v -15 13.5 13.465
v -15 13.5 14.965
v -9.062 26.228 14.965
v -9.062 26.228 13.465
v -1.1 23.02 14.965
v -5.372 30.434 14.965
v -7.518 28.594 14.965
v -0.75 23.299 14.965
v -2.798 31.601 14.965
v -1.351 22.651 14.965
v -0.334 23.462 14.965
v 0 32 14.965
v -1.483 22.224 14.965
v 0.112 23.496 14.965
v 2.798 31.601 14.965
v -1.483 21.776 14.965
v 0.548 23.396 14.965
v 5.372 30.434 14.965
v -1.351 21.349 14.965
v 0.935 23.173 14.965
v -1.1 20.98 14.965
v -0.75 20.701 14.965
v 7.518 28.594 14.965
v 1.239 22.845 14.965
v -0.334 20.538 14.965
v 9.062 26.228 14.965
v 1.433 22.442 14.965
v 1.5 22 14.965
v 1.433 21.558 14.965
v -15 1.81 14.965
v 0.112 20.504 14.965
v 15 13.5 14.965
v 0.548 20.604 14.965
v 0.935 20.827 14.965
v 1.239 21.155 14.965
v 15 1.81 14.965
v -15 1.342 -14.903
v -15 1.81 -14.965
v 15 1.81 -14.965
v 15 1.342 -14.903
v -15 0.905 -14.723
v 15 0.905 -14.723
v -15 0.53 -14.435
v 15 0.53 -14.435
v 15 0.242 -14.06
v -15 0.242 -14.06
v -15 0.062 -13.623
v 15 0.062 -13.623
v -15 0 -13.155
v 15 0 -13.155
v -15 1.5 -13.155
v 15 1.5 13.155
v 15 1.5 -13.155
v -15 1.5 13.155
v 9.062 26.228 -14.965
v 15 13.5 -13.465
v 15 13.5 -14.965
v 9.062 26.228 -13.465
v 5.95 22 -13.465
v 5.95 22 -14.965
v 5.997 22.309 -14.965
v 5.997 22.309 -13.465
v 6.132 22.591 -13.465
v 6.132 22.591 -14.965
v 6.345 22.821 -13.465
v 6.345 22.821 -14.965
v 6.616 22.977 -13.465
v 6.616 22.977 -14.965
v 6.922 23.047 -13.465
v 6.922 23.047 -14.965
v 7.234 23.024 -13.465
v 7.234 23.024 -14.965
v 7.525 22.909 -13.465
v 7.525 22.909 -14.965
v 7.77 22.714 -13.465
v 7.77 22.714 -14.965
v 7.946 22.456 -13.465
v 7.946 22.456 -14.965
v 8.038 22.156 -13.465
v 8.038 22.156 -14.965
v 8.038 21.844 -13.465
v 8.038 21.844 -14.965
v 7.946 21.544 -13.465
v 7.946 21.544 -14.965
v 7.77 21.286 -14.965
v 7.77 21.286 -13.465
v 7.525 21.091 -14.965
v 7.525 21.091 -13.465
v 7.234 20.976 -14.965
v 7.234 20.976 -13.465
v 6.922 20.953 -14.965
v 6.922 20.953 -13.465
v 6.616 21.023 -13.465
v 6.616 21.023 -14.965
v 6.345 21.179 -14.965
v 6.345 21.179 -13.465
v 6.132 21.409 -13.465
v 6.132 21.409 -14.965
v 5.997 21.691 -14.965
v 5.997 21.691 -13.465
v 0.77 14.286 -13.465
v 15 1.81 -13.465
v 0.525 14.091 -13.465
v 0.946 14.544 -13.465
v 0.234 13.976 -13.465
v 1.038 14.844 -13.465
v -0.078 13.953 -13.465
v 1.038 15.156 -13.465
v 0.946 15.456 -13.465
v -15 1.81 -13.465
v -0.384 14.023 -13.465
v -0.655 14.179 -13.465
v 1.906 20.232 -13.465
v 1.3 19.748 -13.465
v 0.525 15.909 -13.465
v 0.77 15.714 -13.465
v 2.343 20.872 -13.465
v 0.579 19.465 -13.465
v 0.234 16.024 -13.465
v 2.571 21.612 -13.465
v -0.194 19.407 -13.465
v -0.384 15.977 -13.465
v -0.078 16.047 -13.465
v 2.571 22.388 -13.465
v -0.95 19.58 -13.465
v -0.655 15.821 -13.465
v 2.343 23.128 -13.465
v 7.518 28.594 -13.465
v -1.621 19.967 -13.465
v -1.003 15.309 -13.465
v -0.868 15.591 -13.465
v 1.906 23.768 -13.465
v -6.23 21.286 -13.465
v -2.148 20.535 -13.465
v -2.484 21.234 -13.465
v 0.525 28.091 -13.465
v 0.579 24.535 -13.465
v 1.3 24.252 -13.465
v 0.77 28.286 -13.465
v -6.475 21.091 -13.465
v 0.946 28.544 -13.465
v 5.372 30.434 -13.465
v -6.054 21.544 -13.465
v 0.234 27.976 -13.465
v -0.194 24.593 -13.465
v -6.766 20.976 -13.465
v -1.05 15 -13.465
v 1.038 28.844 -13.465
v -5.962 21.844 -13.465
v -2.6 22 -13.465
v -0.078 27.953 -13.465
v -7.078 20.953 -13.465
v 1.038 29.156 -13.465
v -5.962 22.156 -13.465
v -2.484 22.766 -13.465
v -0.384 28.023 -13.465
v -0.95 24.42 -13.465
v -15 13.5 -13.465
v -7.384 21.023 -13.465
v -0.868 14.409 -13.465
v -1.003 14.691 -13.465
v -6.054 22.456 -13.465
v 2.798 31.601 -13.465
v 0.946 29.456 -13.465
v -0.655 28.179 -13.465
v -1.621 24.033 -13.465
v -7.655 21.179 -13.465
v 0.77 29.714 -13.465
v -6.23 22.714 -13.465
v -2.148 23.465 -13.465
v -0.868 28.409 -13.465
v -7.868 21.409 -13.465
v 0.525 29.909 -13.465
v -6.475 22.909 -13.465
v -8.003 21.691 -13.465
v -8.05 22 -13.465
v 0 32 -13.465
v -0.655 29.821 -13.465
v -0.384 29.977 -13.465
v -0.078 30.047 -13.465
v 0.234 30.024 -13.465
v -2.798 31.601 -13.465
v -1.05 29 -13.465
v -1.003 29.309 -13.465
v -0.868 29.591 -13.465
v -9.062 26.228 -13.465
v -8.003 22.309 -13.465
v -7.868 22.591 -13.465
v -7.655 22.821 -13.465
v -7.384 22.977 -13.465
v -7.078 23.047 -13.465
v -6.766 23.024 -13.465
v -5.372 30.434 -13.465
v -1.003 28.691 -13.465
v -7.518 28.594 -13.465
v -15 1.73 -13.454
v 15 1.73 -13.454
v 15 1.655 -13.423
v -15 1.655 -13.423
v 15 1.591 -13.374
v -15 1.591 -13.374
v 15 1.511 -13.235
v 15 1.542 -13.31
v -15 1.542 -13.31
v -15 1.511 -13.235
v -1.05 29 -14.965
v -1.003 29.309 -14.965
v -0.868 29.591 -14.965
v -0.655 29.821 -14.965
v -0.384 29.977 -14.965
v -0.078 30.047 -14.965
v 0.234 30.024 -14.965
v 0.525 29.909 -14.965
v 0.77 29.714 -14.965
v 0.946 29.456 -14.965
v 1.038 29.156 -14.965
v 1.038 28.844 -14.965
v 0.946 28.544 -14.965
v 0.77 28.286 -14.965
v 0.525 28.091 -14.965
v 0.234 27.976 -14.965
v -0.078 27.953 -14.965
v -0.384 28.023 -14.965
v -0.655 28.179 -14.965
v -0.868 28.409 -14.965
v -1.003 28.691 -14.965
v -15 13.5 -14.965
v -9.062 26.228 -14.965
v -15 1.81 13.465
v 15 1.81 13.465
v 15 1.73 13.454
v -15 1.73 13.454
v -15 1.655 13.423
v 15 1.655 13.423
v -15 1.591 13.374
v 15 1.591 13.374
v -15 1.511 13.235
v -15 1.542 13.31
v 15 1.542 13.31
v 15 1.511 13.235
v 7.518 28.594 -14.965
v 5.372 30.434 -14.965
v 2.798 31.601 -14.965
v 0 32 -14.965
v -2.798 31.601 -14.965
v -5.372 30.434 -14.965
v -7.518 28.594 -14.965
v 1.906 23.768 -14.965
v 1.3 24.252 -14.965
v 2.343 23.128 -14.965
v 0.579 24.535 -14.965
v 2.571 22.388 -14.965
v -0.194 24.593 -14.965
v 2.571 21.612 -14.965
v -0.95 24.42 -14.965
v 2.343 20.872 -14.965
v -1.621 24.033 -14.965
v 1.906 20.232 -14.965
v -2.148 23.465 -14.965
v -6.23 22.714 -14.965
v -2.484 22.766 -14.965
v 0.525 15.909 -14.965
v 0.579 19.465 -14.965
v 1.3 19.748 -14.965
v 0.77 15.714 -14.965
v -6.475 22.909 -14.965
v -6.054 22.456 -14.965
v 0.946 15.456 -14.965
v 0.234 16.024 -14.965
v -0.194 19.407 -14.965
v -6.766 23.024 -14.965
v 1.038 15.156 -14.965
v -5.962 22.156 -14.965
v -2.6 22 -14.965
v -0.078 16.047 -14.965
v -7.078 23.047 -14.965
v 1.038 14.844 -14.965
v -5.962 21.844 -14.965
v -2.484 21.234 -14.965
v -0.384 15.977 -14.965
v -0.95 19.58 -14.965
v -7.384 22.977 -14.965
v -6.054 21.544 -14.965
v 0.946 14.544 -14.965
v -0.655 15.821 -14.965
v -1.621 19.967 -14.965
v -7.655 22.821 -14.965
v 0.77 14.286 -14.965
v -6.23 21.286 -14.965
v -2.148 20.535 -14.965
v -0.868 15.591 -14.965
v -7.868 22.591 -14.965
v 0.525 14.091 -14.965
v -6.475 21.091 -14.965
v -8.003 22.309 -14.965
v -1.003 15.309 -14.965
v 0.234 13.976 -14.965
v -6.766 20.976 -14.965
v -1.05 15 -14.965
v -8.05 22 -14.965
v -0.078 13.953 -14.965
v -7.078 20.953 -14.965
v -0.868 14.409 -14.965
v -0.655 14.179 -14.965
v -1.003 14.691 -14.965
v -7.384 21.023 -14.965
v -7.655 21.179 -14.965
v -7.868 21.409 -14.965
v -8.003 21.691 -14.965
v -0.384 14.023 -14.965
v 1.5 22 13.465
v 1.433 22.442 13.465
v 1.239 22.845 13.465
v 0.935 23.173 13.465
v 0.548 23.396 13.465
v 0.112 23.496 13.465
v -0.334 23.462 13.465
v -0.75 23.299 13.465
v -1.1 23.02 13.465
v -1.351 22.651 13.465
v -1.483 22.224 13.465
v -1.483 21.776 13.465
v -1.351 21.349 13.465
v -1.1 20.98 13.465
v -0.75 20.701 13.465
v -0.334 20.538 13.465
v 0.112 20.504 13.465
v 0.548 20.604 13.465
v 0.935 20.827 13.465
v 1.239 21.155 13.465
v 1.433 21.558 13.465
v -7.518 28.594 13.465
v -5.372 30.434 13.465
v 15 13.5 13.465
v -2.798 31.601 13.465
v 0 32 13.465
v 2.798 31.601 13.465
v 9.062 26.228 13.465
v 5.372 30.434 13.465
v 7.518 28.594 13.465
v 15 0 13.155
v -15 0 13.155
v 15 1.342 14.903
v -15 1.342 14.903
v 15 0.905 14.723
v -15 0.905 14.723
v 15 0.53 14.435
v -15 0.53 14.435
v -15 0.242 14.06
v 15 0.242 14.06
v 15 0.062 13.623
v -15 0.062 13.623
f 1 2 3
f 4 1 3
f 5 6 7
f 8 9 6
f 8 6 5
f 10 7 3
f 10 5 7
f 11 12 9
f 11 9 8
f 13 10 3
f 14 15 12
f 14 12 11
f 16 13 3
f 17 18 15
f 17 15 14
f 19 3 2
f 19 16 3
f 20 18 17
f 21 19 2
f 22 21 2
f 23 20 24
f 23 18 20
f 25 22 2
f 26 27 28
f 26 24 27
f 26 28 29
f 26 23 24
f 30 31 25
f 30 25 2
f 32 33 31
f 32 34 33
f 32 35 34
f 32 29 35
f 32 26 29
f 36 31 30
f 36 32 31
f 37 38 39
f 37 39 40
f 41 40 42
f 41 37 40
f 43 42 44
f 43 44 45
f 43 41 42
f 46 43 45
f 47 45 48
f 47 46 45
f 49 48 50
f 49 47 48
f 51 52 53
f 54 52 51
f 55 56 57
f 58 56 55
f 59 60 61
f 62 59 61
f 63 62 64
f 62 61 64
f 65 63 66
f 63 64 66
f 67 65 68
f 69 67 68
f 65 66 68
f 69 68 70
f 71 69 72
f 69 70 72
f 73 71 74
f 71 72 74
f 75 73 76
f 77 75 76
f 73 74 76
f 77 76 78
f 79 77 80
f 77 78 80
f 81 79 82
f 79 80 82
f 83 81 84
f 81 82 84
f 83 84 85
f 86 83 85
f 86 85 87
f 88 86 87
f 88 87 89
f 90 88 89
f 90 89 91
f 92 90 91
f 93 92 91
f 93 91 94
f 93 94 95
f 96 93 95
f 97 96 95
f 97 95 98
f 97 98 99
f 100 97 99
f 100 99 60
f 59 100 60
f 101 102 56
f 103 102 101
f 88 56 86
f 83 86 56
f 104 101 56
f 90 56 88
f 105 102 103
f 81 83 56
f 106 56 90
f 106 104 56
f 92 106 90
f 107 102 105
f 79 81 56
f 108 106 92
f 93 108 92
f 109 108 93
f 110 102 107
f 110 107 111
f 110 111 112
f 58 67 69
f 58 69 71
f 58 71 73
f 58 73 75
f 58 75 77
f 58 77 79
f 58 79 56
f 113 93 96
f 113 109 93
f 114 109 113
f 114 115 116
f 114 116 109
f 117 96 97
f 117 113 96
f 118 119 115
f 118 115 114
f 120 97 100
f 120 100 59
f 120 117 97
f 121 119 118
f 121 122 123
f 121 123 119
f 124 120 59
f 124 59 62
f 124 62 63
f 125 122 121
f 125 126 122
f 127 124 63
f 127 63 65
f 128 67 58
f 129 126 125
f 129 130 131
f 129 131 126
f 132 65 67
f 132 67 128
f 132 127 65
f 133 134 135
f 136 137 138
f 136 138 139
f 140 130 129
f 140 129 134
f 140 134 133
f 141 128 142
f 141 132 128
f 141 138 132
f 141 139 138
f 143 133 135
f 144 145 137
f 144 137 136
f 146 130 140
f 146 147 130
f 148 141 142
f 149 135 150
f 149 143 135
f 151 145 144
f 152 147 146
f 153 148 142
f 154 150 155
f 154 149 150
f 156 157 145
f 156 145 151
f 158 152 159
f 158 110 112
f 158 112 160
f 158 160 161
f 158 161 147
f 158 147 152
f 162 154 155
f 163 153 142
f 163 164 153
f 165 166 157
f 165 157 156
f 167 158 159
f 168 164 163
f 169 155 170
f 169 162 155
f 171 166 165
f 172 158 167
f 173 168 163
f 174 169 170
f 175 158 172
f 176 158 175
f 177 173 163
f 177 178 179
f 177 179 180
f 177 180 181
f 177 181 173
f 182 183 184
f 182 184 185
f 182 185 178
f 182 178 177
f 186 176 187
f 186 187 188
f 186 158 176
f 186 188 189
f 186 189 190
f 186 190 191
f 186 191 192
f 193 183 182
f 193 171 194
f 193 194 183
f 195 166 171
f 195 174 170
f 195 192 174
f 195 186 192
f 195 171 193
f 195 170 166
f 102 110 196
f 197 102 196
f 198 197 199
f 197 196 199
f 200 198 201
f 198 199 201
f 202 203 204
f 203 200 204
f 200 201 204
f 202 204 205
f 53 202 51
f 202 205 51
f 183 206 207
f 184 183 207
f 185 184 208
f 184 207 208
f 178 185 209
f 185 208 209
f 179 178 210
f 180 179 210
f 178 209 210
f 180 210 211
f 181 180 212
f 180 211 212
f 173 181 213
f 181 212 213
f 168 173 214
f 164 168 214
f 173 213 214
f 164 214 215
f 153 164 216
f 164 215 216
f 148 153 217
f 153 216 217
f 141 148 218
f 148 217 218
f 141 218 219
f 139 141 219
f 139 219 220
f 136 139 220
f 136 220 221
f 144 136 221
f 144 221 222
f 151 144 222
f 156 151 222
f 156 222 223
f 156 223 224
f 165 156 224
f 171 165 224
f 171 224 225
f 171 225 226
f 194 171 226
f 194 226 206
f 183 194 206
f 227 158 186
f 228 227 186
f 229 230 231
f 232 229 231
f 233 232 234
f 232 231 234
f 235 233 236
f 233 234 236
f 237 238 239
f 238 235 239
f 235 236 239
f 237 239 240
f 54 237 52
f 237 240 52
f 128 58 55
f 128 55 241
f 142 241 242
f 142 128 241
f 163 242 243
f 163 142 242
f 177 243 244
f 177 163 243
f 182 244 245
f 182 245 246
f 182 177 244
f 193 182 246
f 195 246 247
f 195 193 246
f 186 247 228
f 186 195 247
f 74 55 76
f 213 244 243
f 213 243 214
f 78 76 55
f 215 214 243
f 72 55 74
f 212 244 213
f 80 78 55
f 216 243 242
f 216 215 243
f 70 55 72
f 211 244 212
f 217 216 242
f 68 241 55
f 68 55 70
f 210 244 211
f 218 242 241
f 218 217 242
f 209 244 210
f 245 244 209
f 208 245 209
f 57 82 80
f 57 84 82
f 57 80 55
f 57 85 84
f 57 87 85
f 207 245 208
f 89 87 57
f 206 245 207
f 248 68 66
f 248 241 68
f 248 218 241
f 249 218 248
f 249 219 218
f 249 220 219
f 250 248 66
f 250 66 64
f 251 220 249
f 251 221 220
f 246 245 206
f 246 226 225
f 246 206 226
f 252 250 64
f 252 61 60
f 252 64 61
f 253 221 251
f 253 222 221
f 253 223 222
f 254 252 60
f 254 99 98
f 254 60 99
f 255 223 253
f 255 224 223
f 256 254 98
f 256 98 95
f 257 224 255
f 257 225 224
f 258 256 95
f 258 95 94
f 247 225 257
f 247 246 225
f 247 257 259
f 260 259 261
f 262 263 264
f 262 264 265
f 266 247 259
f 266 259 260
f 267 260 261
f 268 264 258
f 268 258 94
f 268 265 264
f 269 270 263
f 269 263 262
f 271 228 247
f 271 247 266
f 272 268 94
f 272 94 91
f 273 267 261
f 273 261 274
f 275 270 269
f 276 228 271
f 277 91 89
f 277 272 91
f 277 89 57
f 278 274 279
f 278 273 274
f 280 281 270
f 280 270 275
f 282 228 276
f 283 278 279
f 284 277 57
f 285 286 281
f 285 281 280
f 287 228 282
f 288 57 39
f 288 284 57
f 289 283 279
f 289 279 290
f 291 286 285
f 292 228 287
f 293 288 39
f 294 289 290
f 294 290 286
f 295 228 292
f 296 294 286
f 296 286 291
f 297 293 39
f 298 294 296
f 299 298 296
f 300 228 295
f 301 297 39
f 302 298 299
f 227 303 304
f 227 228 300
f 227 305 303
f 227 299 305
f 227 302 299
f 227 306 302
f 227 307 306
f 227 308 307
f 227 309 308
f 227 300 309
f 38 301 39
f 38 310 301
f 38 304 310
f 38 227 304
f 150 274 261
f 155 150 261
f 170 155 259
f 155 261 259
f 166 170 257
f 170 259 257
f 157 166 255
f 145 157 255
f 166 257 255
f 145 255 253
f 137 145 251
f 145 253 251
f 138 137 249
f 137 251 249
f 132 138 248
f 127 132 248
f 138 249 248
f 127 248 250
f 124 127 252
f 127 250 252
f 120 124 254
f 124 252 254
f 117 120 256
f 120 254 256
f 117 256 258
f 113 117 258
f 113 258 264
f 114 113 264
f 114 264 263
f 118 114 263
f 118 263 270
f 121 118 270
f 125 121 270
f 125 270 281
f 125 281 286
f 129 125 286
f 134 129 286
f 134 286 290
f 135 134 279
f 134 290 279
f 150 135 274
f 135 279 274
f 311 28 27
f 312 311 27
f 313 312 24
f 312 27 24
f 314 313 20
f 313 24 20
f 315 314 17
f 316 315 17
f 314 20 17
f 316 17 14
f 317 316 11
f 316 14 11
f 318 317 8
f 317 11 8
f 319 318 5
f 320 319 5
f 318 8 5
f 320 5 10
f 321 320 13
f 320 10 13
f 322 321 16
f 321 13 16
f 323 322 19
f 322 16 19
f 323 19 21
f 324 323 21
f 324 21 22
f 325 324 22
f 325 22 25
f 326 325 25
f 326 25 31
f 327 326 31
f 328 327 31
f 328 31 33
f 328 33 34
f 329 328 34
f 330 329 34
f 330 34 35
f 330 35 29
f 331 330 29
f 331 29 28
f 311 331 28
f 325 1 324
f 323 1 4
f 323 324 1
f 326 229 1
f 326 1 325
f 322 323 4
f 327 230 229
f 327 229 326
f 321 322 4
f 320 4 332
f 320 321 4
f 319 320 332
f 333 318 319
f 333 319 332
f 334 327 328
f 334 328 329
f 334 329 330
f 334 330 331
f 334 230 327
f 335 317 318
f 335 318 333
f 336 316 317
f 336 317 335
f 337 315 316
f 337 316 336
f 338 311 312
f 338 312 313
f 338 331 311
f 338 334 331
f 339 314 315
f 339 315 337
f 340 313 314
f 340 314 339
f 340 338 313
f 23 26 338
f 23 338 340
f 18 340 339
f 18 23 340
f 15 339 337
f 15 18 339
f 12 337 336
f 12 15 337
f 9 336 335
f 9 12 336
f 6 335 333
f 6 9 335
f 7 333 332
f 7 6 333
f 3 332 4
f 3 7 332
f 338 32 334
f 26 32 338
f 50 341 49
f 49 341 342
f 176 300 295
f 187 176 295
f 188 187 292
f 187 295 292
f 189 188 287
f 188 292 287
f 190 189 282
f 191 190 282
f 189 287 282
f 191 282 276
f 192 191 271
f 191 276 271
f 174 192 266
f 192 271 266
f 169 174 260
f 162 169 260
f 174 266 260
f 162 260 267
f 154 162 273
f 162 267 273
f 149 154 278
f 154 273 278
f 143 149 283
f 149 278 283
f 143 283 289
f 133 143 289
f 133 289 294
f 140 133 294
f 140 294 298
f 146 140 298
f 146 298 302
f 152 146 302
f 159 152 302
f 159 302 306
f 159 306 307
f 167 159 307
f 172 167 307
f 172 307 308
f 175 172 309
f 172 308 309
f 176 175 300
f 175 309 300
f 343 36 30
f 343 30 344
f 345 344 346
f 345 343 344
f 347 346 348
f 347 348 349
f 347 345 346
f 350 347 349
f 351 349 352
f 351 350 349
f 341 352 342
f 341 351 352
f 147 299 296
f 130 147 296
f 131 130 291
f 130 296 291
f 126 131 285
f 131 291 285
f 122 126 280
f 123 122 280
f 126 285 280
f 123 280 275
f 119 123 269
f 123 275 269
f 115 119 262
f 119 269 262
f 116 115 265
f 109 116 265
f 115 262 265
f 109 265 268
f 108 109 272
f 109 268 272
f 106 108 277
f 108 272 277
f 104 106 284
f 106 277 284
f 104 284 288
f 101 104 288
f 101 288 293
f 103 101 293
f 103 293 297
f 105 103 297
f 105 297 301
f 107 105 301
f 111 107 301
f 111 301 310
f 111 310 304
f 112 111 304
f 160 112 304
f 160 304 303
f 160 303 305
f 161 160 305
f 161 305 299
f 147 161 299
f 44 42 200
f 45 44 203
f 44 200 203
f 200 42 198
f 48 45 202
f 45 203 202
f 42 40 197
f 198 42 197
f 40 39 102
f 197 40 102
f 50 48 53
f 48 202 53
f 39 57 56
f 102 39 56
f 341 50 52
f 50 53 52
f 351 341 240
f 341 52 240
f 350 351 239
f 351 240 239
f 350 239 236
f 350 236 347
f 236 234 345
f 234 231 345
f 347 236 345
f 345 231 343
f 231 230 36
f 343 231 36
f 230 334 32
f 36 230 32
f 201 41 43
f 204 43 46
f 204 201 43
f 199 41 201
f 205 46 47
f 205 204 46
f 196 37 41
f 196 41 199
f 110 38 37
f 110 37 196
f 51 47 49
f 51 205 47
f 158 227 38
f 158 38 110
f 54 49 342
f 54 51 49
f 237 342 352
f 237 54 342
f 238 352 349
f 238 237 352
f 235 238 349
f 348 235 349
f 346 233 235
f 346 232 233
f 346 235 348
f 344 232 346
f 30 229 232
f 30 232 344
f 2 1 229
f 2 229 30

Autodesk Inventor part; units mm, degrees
ref_plane "YZ Plane" through (0, 0, 0) normal (1, 0, 0) x (0, 1, 0)
ref_plane "XZ Plane" through (0, 0, 0) normal (0, 1, 0) x (-1, 0, 0)
ref_plane "XY Plane" through (0, 0, 0) normal (0, 0, 1) x (1, 0, 0)
sketch "Sketch1" plane through (0, 0, 0) normal (0, 1, 0) x (-1, 0, 0)
  line L0 (15, 14.965) -> (-15, 14.965)
  line L1 (-15, 14.965) -> (-15, -14.965)
  line L2 (-15, -14.965) -> (15, -14.965)
  line L3 (15, -14.965) -> (15, 14.965)
  point P0 (0, 0)
  dimension "d0" = 29.93
  dimension "d1" = 30
  dimension "d2" = 15
  dimension "d3" = 14.965
extrude "Plate1" add sketch "Sketch1" along normal blind 1.5
sketch "Sketch2" plane through (-15, 0, -13.465) normal (0, 0, -1) x (-1, 0, 0)
  line L0 (-30, 0) -> (0, 0)
  line L1 (0, 0) -> (0, 32)
  line L2 (0, 32) -> (-30, 32)
  line L3 (-30, 32) -> (-30, 0)
edge flange "Flange1" height 32 angle 90 thickness 1.5 bend radius 0.31 thickness toward (0, 0, -1) relief tear relief width 1.5 relief depth 0.75 corner gap 0.31 corner form 0 edges at (0, 1.5, -14.965) (0, 1.5, 14.965) wall of the first edge with corners at (15, 0, -13.465) (-15, 0, -13.465) (-15, 32, -13.465) (15, 32, -13.465)
bend "Bend1"
corner "Corner1"
sketch "Sketch3" plane through (-15, 32, 14.965) normal (0, 0, 1) x (1, 0, 0)
  line L0 (0, 0) -> (30, 0) projected
  line L1 (0, -30.19) -> (0, 0) projected
  circle A0 centre (15, -10) radius 10
  line L2 (0, -18.5) -> (30, -18.5)
  line L3 (30, -18.5) -> (30, -28.5)
  line L4 (30, -28.5) -> (0, -28.5)
  line L5 (0, -28.5) -> (0, -18.5)
  line L6 (30, -18.5) -> (24.0624, -5.7723)
  line L7 (0, -18.5) -> (5.9376, -5.7723)
  line L8 (0, 0) -> (30, 0)
  line L9 (30, 0) -> (30, -25)
  line L10 (30, -25) -> (0, -25)
  line L11 (0, -25) -> (0, 0)
  point P0 (15, -32)
  point P1 (15, 0)
  dimension "d15" = 10
  dimension "d16" = 0
  dimension "d17" = 20
  dimension "d18" = 8.5
  dimension "d19" = 0
  dimension "d20" = 30
  dimension "d21" = 10
  dimension "d22" = 25
extrude "Extrusion1" cut sketch "Sketch3" against normal blind 35 contours L0 A0 L7 L1 | L0 L9 L6 A0
sketch "Sketch4" plane through (15, 1.81, -14.965) normal (0, 0, -1) x (-1, 0, 0)
  arc A0 (24.0624, 24.4177) -> (5.9376, 24.4177) centre (15, 20.19) ccw projected
  circle A1 centre (15, 20.19) radius 2.6
  circle A2 centre (8, 20.19) radius 1.05
  circle A3 centre (22, 20.19) radius 1.05
  circle A4 centre (15, 27.19) radius 1.05
  circle A5 centre (15, 13.19) radius 1.05
  point P0 (15, -1.81)
  dimension "d25" = 5.2
  dimension "d26" = 0
  dimension "d27" = 7
  dimension "d28" = 2.1
  dimension "d29" = 7
  dimension "d30" = 0
  dimension "d31" = 2.1
  dimension "d32" = 0
  dimension "d33" = 7
  dimension "d34" = 2.1
  dimension "d35" = 7
  dimension "d36" = 0
  dimension "d37" = 2.1
extrude "Extrusion2" cut sketch "Sketch4" against normal blind 1.5
sketch "Sketch5" plane through (-15, 1.81, 14.965) normal (0, 0, 1) x (1, 0, 0)
  arc A0 (24.0624, 24.4177) -> (5.9376, 24.4177) centre (15, 20.19) ccw projected
  circle A1 centre (15, 20.19) radius 1.5
  point P0 (15, -1.81)
  dimension "d40" = 3
extrude "Extrusion3" cut sketch "Sketch5" against normal blind 1.5
equation "\"d4\" = Thickness"
equation "\"d5\" = BendReliefWidth"
equation "\"d6\" = BendReliefDepth"
equation "\"d7\" = MinimumRemnant"
equation "\"d8\" = TransitionRadius"
equation "\"d11\" = BendRadius"
equation "\"d12\" = CornerReliefSize"
equation "\"d13\" = GapSize"
equation "\"d14\" = JacobiRadiusSize"
equation "\"BendReliefWidth\" = Thickness"
equation "\"BendReliefDepth\" = 0.5 * Thickness"
equation "\"CornerReliefSize\" = 4 * Thickness"
equation "\"MinimumRemnant\" = 2 * Thickness"
equation "\"TransitionRadius\" = BendRadius"
equation "\"JacobiRadiusSize\" = BendRadius"
equation "\"GapSize\" = Thickness"
equation "\"Thickness\" = 1.5"
equation "\"BendRadius\" = 0.31"
properties part number "partpart" material "Aluminum 6061-AHC"
